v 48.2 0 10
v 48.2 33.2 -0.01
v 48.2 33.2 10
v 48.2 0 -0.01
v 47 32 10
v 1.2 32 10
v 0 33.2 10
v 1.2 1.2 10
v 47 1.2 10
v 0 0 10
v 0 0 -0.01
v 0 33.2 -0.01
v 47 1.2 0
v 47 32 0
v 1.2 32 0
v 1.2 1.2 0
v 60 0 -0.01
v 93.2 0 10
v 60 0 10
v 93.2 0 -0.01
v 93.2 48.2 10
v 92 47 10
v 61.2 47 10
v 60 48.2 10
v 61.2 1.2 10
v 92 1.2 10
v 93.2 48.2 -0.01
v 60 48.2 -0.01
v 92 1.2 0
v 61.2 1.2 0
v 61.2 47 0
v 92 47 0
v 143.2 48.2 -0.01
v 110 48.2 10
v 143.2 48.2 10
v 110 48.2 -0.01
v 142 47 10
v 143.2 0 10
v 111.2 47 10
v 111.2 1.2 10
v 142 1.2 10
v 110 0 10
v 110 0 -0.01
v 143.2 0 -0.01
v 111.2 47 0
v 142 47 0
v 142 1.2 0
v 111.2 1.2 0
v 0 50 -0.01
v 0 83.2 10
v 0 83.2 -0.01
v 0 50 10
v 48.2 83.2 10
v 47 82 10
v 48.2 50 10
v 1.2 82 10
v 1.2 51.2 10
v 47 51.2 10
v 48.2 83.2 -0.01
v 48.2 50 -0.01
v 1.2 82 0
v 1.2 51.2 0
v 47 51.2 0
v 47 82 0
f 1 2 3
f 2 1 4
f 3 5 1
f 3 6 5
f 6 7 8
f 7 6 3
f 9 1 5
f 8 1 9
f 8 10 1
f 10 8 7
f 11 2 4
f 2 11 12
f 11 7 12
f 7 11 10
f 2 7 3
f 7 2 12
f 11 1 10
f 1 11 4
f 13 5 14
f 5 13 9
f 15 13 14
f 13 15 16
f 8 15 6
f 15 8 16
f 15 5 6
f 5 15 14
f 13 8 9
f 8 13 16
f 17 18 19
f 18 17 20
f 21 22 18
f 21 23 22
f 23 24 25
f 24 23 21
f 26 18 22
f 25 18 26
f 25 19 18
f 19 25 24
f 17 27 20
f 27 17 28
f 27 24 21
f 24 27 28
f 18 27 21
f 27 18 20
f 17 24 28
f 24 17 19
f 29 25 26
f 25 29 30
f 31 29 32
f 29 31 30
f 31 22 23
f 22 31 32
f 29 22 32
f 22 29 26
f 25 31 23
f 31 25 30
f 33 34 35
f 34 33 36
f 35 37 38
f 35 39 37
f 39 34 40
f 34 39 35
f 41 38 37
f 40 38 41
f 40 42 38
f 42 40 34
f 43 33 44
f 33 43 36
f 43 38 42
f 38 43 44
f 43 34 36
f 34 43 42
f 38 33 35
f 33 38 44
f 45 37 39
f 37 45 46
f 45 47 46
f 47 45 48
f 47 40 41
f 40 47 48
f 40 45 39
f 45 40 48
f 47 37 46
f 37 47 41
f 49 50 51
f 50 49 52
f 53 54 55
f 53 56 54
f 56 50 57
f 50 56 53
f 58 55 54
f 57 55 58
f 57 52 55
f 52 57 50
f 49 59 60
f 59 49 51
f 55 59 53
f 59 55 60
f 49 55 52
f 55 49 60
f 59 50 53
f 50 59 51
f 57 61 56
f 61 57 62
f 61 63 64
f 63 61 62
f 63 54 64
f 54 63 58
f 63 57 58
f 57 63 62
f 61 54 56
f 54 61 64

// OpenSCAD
// file: ../../Base/Boxes.scad
// Fischertechnik Box Foundation
// Pre-designed Boxes

use <Constants.scad>

include <PlacementOptions.scad>

box190Width = 190;
box190Depth = 130;
box130Width = 130;
box130Depth = 95;
boxUsageHeight = 33.9;
boxWallThickness = 2.4;
boxBaseThickness = 1.0;

// getBoxWallThickness()
// Gets the wall thickness of a Fischertechnik Box

function getBoxWallThickness() = boxWallThickness;

// Gets the usable height of a fischertechnik box
function getBoxUsageHeight() = boxUsageHeight;

// Gets the thickness of the Fischertechnik box base.
function getBoxBaseThickness() = boxBaseThickness;

// Gets the usable inner space of a Box 190 as an x/y-list
function getBox190Space() = [
    box190Width - 2*getBoxWallThickness(), 
    box190Depth - 2*getBoxWallThickness() ];

// Imports the Fischertechnik empty box 130x190 mm and places it at position 0,0
// 190x130 are the outer sizes, the inner space is slightly smaller. Use getBox190Space() to get the inner sizes.
// This module needs the STL file "Fischertechnik Box 130x190.stl" in the library path.
// The box is positioned that the usable inner space is at the 0,0,0 position. The

module Box190() {
    translate([-getBoxWallThickness(),-getBoxWallThickness(),-getBoxBaseThickness()])
        import("Fischertechnik Box 130x190.stl", convexity=3);
}

// Gets the usable inner space of a Box 130 as an x/y-list
function getBox130Space() = [
    box130Width - 2*getBoxWallThickness(), 
    box130Depth - 2*getBoxWallThickness() ];

// Imports the Fischertechnik empty box 95x130 mm and places it at position 0,0
// 190x130 are the outer sizes, the inner space is slightly smaller. Use getBox190Space() to get the inner sizes.
// This module needs the STL file "Fischertechnik Box 95x130.stl" in the library path.
// The box is positioned that the usable inner space is at the 0,0,0 position. The

module Box130() {
    translate([-getBoxWallThickness(),-getBoxWallThickness(),-getBoxBaseThickness()])
        import("Fischertechnik Box 95x130.stl", convexity=3);
}

// Creates a web at the specified box walls
// corner 0 = LowerLeft, 1 = UpperLeft, 2 = UpperRight, 3 = LowerRight
// side 0 = LeftOfCorner, 1 = RightOfCorner
// distance = Distance in mm from the corner
// box = inner width and depth of the box (default: Box 190)
// webWidth = length of the web (default is 3 mms)
// webThickness = thickness of the web (default is 1 mm)

module BoxWeb(corner, side, distance, box=getBox190Space(), webWidth=3, webThickness=1.0) {
    sink = getBoxWallThickness()/2;

    width = (corner % 2 == 0) ? 
            (side == LeftOfCorner ? webWidth : webThickness) :
            (side == LeftOfCorner ? webThickness : webWidth);

    depth = (corner % 2 == 0) ? 
            (side == RightOfCorner ? webWidth : webThickness) :
            (side == RightOfCorner ? webThickness : webWidth);
    
    xDiff = corner == LowerLeft ? 
                (side == LeftOfCorner ? -sink : distance) :
            (corner == UpperLeft ?                
                (side == LeftOfCorner ? distance : -sink) :
            (corner == UpperRight ?
                (side == LeftOfCorner ? box.x-webWidth+sink : box.x-distance-webThickness) :
                (side == LeftOfCorner ? box.x-distance-webThickness: box.x-webWidth+sink)));

    yDiff = corner == LowerLeft ? 
                (side == RightOfCorner ? -sink : distance) :
            (corner == UpperLeft ?
                (side == RightOfCorner ? box.y-distance : box.y-webWidth+sink) :
            (corner == UpperRight ?
                (side == RightOfCorner ? box.y-webWidth+sink : box.y-distance) :
                (side == RightOfCorner ? distance : -sink)));
    
    translate([xDiff, yDiff, -getExcess()])
        cube([width, depth, boxUsageHeight + 2*getExcess()]);
}
// file: ../../Base/Rotation.scad
// Fischertechnik Box Foundation
// Geometry Helpers Rotation

include <PlacementOptions.scad>

// getRotatedSpace(space, rotation=NoRotation)
// Rotates the space dependent on the specified rotation

function getRotatedSpace(space, rotation=NoRotation) = [
    (rotation == Rotate90 || rotation == Rotate270) ? space.y : space.x,
    (rotation == Rotate90 || rotation == Rotate270) ? space.x : space.y
];

// Rotates the given space around the fixed left lower corner
// space = the space the children needs as width/depth list [width,depth]
// rotation = 0 Rotate0 degrees, 1 Rotate90 degrees, 2 Rotate180 degrees, 3 Rotate270 degrees (equivalent to -90)

module RotateFix(space, rotation=Rotate0) {
    dy = (rotation == Rotate0 || rotation == Rotate270) ? 0 :
        (rotation == Rotate90) ? space.x :
        space.y;
    dx = (rotation < Rotate180) ? 0 :
        (rotation == Rotate180) ? space.x :
        space.y;
    
    translate([dx, dy, 0])
        rotate([0, 0, rotations[rotation]])
            children();
}
// file: ../../Base/Alignment.scad
// Fischertechnik Box Foundation
// Geometry Helpers Alignment

include <PlacementOptions.scad>

// getAlignedX(elementWidth, spaceWidth, align=AlignRight, offset=0)
// Gets the aligned X offset of an element with the given
// width in the given space.
// elementWidth = The width of the element to positon
// spaceWidth = The space where the element should be aligned
// align = 0 AlignLeft, 1 AlignCenter, 2 AlignRight
// offset = an optional offset from the aligned position. When
// aligned left or centered, then positive values are in X direction.
// When aligned right then positive values are in negative X direction.

function getAlignedX(elementWidth, spaceWidth, align=AlignRight, offset=0) =
    (align == AlignLeft) ?
        offset :
        ((align == AlignCenter) ?
        (spaceWidth - elementWidth)/2 + offset :
        spaceWidth - offset - elementWidth);

// getAlignedY(elementDepth, spaceDepth, align=AlignTop, offset=0)
// Gets the aligned Y offset of an element with the given
// depth in the given space.
// elementDepth = The depth of the element to positon
// spaceDepth = The space where the element should be aligned
// align = 0 AlignBottom, 1 AlignCenter, 2 AlignTop
// offset = an optional offset from the aligned position. When
// aligned bottom or centered, then positive values are in Y direction.
// When aligned top then positive values are in negative Y direction.

function getAlignedY(elementDepth, spaceDepth, align=AlignTop, offset=0) =
    (align == AlignBottom) ?
        offset :
        ((align == AlignCenter) ?
        (spaceDepth - elementDepth)/2 + offset :
        spaceDepth - offset - elementDepth);
// file: ../../Base/Constants.scad
// Fischertechnik Box Foundation
// Constants

// Constant values necessary for multiple elements

// Base constants
dividerThickness = 1.2;
excess = 0.01;
fragments = 90;
tolerance = 0.8;

// Gets the thickness of a divider 
function getDividerThickness() = dividerThickness;

// Gets the excess that is used to merge walls into each other
function getExcess() = excess;

// Gets amount of fragments of a cylinder
function getFragments() = fragments;

// Gets the inner tolerance of a frame to each side
function getTolerance() = tolerance;


// Fischertechnik specific constants
axisDiameter = 4;
axisBottomDiameter = axisDiameter + 1;
standardEdgeDistance = 2.5;
standardWebDistance = 11.5;
standardCornerLength = 15;
tubeWallFactor = 1.6;

// Gets axis diameter
function getAxisDiameter() = axisDiameter;

// Gets axis bottom diameter for thicker part at the bottom
function getAxisBottomDiameter() = axisBottomDiameter;

// gets the standard distance to the wall of the box for dockable frames with webs
function getStandardEdgeDistance() = standardEdgeDistance;

// gets the standard distance of each web to the corner of the dockable frame
function getStandardWebDistance() = standardWebDistance;

// gets the standard length of the corner walls of a dockable frame
function getStandardCornerLength() = standardCornerLength;

// gets the wall thickness of a tube.
function getTubeWallThickness() = tubeWallFactor * getDividerThickness();
// file: ../../Base/PlacementOptions.scad
// Fischertechnik Box Foundation
// Placement Options

// Alignment
NoAlign = 0;
AlignLeft = 1;
AlignBottom = 2;
AlignCenter = 3;
AlignRight = 4;
AlignTop = 5;

// Element rotation degree steps
rotations = [0, -90, -180, -270];

// Rotation
NoRotation = 0;
Rotate0 = 0;
Rotate90 = 1;
Rotate180 = 2;
Rotate270 = 3;

// Docking (seen from above)
NoDock = -1;
DockLeft = 0;
DockTop = 1;
DockRight = 2;
DockCorner = 2;
DockBottom = 3;

// Web corners
LowerLeft = 0;
UpperLeft = 1;
UpperRight = 2;
LowerRight = 3;

// Web position relative to corner
LeftOfCorner = 0;
RightOfCorner = 1;
// file: ../../Elements/FrameDriversCabWithHole.scad
// Fischertechnik Box Library
// Driver's Cab with Hole
// 38443

use <../Base/Constants.scad>
use <../ModelBase/Simple.scad>

width = 45;
depth = 30;
height = 10;

// getFrameDriversCabWithHoleSpace()
// Gets the space the frame driver's cab with hole needs as width (.x and .y as a list)

function getFrameDriversCabWithHoleSpace() = getFrameOuterVolume([width, depth, height]);

// FrameDriversCabWithHole()
// Frame for Driver's Cab With Hole
// 38443

module FrameDriversCabWithHole() {
    Frame([width, depth, height]);
}

// Test
color("lightgray") {
FrameDriversCabWithHole();
}
// file: ../../Base/Placement.scad
// Fischertechnik Box Foundation
// Geometry Helpers Placement

use <Constants.scad>
use <Alignment.scad>
use <Rotation.scad>
use <Boxes.scad>

include <PlacementOptions.scad>

// Place(x=0, y=0, elementSpace=[0,0], alignX=AlignLeft, alignY=AlignBottom, rotation=Rotate0, boxSpace=getBox190Space())
// Places the child at the specified position
// y = Y-Position. This is a relative position when an X aligment is specified.
// x = X-Position. This is a relative position when an Y aligment is specified.
// elementSpace = space of the element to be placed [x,y]
// alignX = -1=NoAlign, 0 AlignLeft, 1 AlignCenter, 3 AlignRight (elementSpace and boxSpace required!)
// alignY = -1=NoAlign, 2 AlignBottom, 1 AlignCenter, 4 AlignTop (elementSpace and boxSpace required!)
// rotation = 0 Rotate0 0 degrees, 1 Rotate90 90 degrees, 
// 2 Rotate180 180 degrees, 3 Rotate270 270 degrees (equivalent to -90)
// boxSpace = Inner space of the box where the placement occurs [x,y] - default is Box 190x130 inner space

module Place(x=0, y=0, elementSpace=[0,0], 
  alignX=AlignLeft, alignY=AlignBottom, 
  rotation=NoRotation, boxSpace=getBox190Space()) {

    module Position(x, y, space, rotation=Rotate0) {
        translate([x, y, 0])
            RotateFix(space, rotation)
                children(0);
    }

    space = getRotatedSpace(elementSpace, rotation);
    alignedX = getAlignedX(space.x, boxSpace.x, alignX, x);
    alignedY = getAlignedY(space.y, boxSpace.y, alignY, y);
    Position(alignedX, alignedY, elementSpace, rotation)
        children(0);
}

// Center(space=getBox130Space(), elementSpace=[0,0])
// space = Space where the children is centered. For cylinder use centered=true and no elementSpace.
// elementSpace = space of the element to be centered [x,y]

module Center(space=getBox190Space(), elementSpace=[0,0]) {
    translate([(space.x - elementSpace.x) / 2, (space.y - elementSpace.y) / 2])
        children(0);
}

// CenterHorizontal(width=0, y=0, offset=0, space=getBox130Space())
// space = Space where the children is centered. For cylinder use centered=true and no elementSpace.
// elementSpace = space of the element to be centered [x,y]

module CenterHorizontal(width=0, y=0, offset=0, space=getBox190Space()) {
    translate([(space.x - width) / 2 + offset, y])
        children(0);
}

// CenterVertical(depth=0, x=0, offset=0, space=getBox130Space())
// space = Space where the children is centered. For cylinder use centered=true and no elementSpace.
// elementSpace = space of the element to be centered [x,y]

module CenterVerticalal(depth=0, x=0, offset=0, space=getBox190Space()) {
    translate([x, (space.y - depth) / 2 + offset])
        children(0);
}
// main file
// Fischertechnik Box Foundation
// Elements
// Test FrameDriversCabWithHole

use <../../Base/Placement.scad>
use <../../Elements/FrameDriversCabWithHole.scad>

include <../../Base/PlacementOptions.scad>

FrameDriversCabWithHole();

Place(60, 0, elementSpace=getFrameDriversCabWithHoleSpace(), rotation=Rotate90)
    FrameDriversCabWithHole();
    
Place(110, 0, elementSpace=getFrameDriversCabWithHoleSpace(), rotation=Rotate270)
    FrameDriversCabWithHole();
    
Place(0, 50, elementSpace=getFrameDriversCabWithHoleSpace(), rotation=Rotate180)
    FrameDriversCabWithHole();
